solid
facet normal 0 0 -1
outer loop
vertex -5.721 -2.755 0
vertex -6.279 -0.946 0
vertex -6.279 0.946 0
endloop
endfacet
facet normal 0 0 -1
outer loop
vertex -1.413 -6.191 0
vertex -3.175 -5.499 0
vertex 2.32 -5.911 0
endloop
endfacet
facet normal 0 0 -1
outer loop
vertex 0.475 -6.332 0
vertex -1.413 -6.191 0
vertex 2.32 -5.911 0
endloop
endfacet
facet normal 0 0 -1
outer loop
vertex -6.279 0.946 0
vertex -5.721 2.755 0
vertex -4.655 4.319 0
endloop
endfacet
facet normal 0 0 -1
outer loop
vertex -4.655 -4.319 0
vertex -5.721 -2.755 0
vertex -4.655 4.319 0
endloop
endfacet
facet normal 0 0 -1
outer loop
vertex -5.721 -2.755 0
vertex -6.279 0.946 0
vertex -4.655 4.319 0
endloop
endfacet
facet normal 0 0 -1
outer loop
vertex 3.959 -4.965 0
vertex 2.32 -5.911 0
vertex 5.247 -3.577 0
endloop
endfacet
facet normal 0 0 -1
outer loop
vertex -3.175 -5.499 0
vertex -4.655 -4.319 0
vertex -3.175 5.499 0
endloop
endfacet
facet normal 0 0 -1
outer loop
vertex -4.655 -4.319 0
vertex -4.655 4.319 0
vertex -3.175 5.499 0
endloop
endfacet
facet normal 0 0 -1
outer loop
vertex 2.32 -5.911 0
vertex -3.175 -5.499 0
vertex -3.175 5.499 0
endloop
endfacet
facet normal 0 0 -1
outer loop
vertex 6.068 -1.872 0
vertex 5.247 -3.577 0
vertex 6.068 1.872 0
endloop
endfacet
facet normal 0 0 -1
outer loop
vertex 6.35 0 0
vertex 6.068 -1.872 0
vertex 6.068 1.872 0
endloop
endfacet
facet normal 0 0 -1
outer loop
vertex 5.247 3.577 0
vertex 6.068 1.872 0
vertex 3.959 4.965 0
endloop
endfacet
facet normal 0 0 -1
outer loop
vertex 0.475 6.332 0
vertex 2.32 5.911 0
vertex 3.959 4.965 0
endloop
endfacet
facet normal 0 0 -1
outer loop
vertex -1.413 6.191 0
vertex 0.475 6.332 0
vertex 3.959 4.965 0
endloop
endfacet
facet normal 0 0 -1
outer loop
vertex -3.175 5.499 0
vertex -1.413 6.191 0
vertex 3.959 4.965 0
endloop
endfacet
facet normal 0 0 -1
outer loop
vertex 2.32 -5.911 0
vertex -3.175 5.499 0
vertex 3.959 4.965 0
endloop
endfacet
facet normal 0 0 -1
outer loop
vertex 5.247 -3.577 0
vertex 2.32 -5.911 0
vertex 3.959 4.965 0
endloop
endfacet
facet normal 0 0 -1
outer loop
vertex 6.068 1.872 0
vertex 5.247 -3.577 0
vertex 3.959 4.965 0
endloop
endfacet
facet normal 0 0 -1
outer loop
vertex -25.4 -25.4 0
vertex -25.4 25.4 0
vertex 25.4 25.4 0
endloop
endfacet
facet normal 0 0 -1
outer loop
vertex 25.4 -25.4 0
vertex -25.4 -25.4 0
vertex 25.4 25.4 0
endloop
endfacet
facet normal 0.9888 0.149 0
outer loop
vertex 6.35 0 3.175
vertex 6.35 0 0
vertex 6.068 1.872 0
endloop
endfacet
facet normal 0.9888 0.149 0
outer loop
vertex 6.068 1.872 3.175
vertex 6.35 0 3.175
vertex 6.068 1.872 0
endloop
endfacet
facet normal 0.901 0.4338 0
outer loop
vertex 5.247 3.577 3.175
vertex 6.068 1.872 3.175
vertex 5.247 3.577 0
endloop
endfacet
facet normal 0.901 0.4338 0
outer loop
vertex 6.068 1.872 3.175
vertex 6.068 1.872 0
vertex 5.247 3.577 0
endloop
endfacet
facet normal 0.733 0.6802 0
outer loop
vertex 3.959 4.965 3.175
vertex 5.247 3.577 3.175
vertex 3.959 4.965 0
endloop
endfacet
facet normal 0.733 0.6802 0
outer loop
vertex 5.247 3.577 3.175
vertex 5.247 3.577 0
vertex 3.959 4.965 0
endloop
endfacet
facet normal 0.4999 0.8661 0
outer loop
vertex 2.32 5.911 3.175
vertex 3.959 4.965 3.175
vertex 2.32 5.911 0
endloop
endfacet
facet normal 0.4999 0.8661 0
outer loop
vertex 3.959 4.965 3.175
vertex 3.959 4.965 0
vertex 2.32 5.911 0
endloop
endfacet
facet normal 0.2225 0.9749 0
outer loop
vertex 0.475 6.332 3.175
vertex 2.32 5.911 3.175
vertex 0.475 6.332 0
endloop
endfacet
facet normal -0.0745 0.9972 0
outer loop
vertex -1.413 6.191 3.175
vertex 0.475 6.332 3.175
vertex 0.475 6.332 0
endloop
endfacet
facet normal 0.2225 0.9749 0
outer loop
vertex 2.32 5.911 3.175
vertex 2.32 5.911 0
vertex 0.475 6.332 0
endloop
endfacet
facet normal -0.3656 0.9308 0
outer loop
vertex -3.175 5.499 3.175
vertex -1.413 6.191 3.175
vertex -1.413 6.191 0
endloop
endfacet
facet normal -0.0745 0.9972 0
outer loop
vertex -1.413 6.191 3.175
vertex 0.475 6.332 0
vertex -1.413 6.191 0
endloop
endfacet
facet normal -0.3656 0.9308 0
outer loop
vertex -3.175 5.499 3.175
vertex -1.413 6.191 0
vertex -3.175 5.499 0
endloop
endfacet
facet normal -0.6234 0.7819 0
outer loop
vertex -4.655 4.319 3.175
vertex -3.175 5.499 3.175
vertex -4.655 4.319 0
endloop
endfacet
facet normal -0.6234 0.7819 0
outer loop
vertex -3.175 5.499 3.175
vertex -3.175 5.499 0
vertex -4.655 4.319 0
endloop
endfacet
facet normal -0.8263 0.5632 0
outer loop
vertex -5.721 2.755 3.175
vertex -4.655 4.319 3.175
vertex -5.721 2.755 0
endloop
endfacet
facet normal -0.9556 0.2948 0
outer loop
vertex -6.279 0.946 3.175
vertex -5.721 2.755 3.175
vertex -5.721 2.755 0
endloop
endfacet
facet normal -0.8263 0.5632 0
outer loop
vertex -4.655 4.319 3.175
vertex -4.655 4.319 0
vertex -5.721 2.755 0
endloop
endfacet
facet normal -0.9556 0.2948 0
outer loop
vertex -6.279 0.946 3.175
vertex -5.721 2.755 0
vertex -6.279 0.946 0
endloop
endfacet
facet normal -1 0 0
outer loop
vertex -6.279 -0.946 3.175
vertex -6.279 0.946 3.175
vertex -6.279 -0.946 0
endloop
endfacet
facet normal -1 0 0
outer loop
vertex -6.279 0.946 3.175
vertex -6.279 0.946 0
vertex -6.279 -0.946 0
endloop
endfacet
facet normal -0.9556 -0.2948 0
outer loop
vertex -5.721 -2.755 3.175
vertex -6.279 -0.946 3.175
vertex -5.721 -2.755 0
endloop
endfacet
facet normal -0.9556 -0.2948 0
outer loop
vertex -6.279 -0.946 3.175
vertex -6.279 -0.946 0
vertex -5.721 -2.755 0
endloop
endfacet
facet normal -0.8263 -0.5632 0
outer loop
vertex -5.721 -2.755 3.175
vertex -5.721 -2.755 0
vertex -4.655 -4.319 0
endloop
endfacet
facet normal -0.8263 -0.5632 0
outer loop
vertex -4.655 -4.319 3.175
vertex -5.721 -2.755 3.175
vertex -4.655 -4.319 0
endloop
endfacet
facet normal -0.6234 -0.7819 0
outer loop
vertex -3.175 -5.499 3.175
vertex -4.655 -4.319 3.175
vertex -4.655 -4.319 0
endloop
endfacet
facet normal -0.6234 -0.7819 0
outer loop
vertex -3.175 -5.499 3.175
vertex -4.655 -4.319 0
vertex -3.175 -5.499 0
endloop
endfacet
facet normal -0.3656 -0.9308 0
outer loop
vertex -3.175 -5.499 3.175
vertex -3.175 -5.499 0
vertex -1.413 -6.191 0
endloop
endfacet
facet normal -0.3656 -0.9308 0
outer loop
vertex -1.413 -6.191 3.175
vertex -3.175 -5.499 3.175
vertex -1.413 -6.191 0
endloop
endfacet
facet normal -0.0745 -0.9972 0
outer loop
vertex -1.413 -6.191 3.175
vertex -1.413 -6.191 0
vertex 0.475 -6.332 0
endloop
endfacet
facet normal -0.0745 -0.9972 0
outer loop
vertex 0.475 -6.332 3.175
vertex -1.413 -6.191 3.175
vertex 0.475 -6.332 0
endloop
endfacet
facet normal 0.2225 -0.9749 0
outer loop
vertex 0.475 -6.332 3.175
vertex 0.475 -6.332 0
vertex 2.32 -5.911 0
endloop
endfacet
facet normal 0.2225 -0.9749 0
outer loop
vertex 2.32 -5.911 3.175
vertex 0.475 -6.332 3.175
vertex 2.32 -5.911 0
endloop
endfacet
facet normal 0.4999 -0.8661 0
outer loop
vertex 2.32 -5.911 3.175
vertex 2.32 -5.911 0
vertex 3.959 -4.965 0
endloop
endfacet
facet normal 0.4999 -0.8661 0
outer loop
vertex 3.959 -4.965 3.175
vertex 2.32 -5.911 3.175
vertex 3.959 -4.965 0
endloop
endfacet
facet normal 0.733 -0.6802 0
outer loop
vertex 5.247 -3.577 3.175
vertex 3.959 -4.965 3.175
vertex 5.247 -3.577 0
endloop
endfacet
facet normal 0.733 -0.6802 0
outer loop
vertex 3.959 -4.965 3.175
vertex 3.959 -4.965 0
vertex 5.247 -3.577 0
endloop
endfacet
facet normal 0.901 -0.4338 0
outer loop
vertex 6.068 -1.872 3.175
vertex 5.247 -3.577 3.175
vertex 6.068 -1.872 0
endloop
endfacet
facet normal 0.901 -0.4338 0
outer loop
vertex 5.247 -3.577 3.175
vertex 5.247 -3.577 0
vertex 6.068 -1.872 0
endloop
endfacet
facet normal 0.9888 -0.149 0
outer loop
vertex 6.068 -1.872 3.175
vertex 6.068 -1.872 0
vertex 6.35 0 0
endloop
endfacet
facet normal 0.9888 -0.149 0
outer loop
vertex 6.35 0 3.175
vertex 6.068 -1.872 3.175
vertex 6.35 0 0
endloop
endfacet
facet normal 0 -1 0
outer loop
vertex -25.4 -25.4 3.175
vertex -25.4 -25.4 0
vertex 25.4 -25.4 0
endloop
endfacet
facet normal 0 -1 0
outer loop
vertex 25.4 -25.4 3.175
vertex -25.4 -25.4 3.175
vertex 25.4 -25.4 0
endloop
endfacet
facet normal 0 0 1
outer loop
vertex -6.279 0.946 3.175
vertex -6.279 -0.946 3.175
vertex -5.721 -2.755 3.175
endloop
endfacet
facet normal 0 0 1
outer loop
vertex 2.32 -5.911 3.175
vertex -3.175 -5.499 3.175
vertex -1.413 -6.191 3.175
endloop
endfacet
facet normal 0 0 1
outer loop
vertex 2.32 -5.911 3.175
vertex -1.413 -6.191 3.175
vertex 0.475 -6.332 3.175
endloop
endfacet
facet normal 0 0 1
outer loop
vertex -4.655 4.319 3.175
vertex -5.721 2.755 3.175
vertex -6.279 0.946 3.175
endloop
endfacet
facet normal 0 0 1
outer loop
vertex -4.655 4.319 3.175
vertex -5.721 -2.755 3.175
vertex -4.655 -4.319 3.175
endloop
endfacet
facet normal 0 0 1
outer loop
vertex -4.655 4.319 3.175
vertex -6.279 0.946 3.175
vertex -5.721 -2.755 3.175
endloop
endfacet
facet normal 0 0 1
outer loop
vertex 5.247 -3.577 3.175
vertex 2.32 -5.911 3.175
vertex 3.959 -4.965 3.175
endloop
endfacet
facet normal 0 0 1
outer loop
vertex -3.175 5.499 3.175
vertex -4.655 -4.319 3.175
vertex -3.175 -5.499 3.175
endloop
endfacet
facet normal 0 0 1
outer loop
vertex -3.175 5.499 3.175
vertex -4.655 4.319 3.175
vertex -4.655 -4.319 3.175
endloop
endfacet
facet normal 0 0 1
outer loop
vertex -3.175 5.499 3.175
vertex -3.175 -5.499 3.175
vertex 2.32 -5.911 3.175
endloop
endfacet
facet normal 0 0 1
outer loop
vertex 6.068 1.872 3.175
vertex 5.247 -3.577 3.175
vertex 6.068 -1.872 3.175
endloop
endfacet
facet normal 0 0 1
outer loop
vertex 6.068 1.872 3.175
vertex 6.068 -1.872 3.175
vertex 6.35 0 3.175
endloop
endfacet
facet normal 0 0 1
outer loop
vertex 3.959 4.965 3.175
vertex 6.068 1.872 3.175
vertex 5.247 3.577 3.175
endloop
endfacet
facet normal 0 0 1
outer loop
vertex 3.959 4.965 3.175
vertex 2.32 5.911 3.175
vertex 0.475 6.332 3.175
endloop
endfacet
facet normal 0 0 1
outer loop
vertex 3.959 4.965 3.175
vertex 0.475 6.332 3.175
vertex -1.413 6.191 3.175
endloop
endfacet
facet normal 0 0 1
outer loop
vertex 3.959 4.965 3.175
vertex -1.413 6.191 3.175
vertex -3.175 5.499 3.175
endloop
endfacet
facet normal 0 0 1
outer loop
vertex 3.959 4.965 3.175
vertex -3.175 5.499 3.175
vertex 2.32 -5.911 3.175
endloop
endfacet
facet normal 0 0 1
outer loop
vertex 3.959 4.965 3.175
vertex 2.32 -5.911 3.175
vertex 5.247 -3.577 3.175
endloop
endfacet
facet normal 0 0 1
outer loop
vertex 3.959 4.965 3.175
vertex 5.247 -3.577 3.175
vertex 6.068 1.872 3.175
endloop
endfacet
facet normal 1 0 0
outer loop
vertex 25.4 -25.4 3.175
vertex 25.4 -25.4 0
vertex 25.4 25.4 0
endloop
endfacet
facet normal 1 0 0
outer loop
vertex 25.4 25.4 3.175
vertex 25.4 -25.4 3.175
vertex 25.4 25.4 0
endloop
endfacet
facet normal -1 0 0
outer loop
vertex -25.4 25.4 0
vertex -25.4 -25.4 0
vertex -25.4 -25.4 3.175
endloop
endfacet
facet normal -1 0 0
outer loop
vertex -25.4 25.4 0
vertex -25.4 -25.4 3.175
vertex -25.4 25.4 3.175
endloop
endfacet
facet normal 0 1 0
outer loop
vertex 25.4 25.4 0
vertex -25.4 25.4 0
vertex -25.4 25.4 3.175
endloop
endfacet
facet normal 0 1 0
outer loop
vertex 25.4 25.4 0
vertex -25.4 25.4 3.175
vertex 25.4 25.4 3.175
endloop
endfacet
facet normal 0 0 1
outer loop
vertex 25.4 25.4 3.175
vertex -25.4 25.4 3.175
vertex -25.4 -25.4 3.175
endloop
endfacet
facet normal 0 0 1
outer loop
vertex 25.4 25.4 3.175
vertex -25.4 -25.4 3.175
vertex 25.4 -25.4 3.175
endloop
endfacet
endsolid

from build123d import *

# Parameters (mm, degrees)
F0_W     = 50.8
F0_H     = 50.8
F1_DEPTH = 3.175
F2_R     = 6.35
F3_DEPTH = 3.175


with BuildPart() as f1:
    # F0 (on Top) → F1 (new body)
    with BuildSketch(Plane.XY):
        Rectangle(F0_W, F0_H)
    extrude(amount=F1_DEPTH)


with BuildPart() as f3:
    # F2 (on Top) → F3 (new body)
    with BuildSketch(Plane.XY):
        Circle(F2_R)
    extrude(amount=F3_DEPTH)


solid = Compound([f1.part, f3.part])
